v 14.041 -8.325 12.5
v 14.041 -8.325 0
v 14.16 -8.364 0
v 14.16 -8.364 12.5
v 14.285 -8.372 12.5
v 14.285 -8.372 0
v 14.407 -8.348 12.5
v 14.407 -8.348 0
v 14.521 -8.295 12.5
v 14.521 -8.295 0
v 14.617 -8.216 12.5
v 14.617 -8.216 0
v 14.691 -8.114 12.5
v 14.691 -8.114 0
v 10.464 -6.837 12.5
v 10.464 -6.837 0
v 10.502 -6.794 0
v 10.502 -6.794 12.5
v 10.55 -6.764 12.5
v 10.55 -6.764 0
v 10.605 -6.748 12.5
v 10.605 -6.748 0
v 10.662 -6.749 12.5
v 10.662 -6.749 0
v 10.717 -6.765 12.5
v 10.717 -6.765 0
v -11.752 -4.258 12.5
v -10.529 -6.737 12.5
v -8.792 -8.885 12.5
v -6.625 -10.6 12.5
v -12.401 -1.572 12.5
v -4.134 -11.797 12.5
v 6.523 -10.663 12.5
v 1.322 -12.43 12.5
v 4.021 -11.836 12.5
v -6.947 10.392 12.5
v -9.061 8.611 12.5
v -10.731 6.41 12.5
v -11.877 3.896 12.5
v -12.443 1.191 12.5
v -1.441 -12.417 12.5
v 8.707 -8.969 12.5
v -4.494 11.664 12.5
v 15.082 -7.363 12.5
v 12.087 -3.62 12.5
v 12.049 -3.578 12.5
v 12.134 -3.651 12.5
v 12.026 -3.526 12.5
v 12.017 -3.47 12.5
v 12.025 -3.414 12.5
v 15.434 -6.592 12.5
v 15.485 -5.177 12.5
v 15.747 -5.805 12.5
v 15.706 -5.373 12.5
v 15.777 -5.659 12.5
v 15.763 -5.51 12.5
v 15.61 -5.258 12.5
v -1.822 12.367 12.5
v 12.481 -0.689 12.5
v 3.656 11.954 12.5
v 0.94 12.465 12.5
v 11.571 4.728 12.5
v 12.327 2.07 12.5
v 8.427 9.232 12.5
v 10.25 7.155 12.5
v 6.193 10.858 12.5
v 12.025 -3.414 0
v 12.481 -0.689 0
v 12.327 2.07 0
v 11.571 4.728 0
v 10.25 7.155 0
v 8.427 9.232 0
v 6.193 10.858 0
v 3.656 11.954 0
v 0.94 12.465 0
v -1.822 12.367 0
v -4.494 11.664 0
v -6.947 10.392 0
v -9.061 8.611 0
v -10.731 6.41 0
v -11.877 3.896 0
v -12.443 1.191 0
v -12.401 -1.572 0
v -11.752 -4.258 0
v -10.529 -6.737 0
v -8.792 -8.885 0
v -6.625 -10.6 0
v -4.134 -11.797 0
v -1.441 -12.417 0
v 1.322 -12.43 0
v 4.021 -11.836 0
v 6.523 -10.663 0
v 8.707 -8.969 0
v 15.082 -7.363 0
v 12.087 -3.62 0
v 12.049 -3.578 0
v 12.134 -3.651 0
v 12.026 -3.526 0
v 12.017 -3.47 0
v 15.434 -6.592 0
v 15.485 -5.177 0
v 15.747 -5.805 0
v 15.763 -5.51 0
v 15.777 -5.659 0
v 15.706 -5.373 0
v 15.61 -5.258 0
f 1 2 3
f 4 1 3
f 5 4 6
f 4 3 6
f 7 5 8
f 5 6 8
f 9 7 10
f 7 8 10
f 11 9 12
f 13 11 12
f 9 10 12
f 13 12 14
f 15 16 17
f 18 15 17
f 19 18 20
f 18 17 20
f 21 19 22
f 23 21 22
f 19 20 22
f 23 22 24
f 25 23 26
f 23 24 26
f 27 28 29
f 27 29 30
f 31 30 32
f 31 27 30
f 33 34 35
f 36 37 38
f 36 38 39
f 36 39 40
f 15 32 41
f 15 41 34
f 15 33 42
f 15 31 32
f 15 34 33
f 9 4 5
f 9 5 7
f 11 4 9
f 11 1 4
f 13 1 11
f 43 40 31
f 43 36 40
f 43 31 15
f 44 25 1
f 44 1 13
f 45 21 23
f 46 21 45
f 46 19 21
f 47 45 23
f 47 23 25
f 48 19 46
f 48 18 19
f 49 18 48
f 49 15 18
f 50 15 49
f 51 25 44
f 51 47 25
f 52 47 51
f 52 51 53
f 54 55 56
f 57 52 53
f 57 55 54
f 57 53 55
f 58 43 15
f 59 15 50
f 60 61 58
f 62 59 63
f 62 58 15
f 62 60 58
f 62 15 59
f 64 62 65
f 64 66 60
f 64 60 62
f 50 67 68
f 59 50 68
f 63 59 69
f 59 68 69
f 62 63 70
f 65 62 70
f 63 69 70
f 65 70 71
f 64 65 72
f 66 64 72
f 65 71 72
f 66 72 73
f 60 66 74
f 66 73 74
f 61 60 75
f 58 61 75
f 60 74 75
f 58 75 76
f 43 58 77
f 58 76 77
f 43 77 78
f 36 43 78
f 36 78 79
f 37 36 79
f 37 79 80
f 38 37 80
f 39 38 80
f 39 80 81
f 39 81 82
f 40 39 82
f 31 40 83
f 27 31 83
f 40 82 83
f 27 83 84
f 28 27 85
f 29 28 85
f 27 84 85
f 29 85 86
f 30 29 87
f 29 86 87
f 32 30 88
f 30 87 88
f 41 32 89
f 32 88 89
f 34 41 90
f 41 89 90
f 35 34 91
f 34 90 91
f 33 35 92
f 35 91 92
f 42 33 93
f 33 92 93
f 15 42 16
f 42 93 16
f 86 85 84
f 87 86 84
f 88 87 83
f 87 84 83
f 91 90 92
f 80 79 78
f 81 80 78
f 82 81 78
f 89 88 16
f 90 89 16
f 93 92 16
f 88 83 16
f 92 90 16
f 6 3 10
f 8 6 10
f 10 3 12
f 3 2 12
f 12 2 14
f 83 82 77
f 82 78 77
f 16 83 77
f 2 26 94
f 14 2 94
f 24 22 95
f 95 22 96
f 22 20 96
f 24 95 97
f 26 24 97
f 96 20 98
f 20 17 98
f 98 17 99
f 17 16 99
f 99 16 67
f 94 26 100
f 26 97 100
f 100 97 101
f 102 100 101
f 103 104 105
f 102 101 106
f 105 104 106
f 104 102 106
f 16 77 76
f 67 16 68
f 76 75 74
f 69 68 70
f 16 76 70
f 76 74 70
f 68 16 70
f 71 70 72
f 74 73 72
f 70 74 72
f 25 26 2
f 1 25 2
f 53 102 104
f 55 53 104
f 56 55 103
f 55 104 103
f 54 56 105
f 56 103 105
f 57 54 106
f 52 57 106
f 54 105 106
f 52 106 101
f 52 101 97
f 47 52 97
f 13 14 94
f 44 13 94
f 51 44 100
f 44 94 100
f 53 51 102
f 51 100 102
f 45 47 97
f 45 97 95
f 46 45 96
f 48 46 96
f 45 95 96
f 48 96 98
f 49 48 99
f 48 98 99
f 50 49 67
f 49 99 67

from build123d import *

# Parameters (mm, degrees)
BOSS_EXTRU_3_DEPTH = 12.5


with BuildPart() as part:
    # Esquisse1 → Boss.-Extru.3 (new body)
    with BuildSketch(Plane.XY):
        with BuildLine():
            Line((15.485185595, -5.176669047), (12.134231543, -3.650742984))
            ThreePointArc((12.134231543, -3.650742984), (12.035609724, -3.552721892), (12.024721053, -3.414100701))
            ThreePointArc((12.024721053, -3.414100701), (-11.374079439, 5.184623122), (10.464430261, -6.837082661))
            ThreePointArc((10.464430261, -6.837082661), (10.577237298, -6.754079946), (10.716830338, -6.765422852))
            Line((10.716830338, -6.765422852), (14.040747626, -8.325354826))
            ThreePointArc((14.040747626, -8.325354826), (14.40745115, -8.348324263), (14.690843755, -8.114470246))
            ThreePointArc((14.690843755, -8.114470246), (15.262737454, -6.979567539), (15.747114807, -5.80464408))
            ThreePointArc((15.747114807, -5.80464408), (15.739440197, -5.439232144), (15.485185595, -5.176669047))
        make_face()
    extrude(amount=BOSS_EXTRU_3_DEPTH)


solid = part.part
